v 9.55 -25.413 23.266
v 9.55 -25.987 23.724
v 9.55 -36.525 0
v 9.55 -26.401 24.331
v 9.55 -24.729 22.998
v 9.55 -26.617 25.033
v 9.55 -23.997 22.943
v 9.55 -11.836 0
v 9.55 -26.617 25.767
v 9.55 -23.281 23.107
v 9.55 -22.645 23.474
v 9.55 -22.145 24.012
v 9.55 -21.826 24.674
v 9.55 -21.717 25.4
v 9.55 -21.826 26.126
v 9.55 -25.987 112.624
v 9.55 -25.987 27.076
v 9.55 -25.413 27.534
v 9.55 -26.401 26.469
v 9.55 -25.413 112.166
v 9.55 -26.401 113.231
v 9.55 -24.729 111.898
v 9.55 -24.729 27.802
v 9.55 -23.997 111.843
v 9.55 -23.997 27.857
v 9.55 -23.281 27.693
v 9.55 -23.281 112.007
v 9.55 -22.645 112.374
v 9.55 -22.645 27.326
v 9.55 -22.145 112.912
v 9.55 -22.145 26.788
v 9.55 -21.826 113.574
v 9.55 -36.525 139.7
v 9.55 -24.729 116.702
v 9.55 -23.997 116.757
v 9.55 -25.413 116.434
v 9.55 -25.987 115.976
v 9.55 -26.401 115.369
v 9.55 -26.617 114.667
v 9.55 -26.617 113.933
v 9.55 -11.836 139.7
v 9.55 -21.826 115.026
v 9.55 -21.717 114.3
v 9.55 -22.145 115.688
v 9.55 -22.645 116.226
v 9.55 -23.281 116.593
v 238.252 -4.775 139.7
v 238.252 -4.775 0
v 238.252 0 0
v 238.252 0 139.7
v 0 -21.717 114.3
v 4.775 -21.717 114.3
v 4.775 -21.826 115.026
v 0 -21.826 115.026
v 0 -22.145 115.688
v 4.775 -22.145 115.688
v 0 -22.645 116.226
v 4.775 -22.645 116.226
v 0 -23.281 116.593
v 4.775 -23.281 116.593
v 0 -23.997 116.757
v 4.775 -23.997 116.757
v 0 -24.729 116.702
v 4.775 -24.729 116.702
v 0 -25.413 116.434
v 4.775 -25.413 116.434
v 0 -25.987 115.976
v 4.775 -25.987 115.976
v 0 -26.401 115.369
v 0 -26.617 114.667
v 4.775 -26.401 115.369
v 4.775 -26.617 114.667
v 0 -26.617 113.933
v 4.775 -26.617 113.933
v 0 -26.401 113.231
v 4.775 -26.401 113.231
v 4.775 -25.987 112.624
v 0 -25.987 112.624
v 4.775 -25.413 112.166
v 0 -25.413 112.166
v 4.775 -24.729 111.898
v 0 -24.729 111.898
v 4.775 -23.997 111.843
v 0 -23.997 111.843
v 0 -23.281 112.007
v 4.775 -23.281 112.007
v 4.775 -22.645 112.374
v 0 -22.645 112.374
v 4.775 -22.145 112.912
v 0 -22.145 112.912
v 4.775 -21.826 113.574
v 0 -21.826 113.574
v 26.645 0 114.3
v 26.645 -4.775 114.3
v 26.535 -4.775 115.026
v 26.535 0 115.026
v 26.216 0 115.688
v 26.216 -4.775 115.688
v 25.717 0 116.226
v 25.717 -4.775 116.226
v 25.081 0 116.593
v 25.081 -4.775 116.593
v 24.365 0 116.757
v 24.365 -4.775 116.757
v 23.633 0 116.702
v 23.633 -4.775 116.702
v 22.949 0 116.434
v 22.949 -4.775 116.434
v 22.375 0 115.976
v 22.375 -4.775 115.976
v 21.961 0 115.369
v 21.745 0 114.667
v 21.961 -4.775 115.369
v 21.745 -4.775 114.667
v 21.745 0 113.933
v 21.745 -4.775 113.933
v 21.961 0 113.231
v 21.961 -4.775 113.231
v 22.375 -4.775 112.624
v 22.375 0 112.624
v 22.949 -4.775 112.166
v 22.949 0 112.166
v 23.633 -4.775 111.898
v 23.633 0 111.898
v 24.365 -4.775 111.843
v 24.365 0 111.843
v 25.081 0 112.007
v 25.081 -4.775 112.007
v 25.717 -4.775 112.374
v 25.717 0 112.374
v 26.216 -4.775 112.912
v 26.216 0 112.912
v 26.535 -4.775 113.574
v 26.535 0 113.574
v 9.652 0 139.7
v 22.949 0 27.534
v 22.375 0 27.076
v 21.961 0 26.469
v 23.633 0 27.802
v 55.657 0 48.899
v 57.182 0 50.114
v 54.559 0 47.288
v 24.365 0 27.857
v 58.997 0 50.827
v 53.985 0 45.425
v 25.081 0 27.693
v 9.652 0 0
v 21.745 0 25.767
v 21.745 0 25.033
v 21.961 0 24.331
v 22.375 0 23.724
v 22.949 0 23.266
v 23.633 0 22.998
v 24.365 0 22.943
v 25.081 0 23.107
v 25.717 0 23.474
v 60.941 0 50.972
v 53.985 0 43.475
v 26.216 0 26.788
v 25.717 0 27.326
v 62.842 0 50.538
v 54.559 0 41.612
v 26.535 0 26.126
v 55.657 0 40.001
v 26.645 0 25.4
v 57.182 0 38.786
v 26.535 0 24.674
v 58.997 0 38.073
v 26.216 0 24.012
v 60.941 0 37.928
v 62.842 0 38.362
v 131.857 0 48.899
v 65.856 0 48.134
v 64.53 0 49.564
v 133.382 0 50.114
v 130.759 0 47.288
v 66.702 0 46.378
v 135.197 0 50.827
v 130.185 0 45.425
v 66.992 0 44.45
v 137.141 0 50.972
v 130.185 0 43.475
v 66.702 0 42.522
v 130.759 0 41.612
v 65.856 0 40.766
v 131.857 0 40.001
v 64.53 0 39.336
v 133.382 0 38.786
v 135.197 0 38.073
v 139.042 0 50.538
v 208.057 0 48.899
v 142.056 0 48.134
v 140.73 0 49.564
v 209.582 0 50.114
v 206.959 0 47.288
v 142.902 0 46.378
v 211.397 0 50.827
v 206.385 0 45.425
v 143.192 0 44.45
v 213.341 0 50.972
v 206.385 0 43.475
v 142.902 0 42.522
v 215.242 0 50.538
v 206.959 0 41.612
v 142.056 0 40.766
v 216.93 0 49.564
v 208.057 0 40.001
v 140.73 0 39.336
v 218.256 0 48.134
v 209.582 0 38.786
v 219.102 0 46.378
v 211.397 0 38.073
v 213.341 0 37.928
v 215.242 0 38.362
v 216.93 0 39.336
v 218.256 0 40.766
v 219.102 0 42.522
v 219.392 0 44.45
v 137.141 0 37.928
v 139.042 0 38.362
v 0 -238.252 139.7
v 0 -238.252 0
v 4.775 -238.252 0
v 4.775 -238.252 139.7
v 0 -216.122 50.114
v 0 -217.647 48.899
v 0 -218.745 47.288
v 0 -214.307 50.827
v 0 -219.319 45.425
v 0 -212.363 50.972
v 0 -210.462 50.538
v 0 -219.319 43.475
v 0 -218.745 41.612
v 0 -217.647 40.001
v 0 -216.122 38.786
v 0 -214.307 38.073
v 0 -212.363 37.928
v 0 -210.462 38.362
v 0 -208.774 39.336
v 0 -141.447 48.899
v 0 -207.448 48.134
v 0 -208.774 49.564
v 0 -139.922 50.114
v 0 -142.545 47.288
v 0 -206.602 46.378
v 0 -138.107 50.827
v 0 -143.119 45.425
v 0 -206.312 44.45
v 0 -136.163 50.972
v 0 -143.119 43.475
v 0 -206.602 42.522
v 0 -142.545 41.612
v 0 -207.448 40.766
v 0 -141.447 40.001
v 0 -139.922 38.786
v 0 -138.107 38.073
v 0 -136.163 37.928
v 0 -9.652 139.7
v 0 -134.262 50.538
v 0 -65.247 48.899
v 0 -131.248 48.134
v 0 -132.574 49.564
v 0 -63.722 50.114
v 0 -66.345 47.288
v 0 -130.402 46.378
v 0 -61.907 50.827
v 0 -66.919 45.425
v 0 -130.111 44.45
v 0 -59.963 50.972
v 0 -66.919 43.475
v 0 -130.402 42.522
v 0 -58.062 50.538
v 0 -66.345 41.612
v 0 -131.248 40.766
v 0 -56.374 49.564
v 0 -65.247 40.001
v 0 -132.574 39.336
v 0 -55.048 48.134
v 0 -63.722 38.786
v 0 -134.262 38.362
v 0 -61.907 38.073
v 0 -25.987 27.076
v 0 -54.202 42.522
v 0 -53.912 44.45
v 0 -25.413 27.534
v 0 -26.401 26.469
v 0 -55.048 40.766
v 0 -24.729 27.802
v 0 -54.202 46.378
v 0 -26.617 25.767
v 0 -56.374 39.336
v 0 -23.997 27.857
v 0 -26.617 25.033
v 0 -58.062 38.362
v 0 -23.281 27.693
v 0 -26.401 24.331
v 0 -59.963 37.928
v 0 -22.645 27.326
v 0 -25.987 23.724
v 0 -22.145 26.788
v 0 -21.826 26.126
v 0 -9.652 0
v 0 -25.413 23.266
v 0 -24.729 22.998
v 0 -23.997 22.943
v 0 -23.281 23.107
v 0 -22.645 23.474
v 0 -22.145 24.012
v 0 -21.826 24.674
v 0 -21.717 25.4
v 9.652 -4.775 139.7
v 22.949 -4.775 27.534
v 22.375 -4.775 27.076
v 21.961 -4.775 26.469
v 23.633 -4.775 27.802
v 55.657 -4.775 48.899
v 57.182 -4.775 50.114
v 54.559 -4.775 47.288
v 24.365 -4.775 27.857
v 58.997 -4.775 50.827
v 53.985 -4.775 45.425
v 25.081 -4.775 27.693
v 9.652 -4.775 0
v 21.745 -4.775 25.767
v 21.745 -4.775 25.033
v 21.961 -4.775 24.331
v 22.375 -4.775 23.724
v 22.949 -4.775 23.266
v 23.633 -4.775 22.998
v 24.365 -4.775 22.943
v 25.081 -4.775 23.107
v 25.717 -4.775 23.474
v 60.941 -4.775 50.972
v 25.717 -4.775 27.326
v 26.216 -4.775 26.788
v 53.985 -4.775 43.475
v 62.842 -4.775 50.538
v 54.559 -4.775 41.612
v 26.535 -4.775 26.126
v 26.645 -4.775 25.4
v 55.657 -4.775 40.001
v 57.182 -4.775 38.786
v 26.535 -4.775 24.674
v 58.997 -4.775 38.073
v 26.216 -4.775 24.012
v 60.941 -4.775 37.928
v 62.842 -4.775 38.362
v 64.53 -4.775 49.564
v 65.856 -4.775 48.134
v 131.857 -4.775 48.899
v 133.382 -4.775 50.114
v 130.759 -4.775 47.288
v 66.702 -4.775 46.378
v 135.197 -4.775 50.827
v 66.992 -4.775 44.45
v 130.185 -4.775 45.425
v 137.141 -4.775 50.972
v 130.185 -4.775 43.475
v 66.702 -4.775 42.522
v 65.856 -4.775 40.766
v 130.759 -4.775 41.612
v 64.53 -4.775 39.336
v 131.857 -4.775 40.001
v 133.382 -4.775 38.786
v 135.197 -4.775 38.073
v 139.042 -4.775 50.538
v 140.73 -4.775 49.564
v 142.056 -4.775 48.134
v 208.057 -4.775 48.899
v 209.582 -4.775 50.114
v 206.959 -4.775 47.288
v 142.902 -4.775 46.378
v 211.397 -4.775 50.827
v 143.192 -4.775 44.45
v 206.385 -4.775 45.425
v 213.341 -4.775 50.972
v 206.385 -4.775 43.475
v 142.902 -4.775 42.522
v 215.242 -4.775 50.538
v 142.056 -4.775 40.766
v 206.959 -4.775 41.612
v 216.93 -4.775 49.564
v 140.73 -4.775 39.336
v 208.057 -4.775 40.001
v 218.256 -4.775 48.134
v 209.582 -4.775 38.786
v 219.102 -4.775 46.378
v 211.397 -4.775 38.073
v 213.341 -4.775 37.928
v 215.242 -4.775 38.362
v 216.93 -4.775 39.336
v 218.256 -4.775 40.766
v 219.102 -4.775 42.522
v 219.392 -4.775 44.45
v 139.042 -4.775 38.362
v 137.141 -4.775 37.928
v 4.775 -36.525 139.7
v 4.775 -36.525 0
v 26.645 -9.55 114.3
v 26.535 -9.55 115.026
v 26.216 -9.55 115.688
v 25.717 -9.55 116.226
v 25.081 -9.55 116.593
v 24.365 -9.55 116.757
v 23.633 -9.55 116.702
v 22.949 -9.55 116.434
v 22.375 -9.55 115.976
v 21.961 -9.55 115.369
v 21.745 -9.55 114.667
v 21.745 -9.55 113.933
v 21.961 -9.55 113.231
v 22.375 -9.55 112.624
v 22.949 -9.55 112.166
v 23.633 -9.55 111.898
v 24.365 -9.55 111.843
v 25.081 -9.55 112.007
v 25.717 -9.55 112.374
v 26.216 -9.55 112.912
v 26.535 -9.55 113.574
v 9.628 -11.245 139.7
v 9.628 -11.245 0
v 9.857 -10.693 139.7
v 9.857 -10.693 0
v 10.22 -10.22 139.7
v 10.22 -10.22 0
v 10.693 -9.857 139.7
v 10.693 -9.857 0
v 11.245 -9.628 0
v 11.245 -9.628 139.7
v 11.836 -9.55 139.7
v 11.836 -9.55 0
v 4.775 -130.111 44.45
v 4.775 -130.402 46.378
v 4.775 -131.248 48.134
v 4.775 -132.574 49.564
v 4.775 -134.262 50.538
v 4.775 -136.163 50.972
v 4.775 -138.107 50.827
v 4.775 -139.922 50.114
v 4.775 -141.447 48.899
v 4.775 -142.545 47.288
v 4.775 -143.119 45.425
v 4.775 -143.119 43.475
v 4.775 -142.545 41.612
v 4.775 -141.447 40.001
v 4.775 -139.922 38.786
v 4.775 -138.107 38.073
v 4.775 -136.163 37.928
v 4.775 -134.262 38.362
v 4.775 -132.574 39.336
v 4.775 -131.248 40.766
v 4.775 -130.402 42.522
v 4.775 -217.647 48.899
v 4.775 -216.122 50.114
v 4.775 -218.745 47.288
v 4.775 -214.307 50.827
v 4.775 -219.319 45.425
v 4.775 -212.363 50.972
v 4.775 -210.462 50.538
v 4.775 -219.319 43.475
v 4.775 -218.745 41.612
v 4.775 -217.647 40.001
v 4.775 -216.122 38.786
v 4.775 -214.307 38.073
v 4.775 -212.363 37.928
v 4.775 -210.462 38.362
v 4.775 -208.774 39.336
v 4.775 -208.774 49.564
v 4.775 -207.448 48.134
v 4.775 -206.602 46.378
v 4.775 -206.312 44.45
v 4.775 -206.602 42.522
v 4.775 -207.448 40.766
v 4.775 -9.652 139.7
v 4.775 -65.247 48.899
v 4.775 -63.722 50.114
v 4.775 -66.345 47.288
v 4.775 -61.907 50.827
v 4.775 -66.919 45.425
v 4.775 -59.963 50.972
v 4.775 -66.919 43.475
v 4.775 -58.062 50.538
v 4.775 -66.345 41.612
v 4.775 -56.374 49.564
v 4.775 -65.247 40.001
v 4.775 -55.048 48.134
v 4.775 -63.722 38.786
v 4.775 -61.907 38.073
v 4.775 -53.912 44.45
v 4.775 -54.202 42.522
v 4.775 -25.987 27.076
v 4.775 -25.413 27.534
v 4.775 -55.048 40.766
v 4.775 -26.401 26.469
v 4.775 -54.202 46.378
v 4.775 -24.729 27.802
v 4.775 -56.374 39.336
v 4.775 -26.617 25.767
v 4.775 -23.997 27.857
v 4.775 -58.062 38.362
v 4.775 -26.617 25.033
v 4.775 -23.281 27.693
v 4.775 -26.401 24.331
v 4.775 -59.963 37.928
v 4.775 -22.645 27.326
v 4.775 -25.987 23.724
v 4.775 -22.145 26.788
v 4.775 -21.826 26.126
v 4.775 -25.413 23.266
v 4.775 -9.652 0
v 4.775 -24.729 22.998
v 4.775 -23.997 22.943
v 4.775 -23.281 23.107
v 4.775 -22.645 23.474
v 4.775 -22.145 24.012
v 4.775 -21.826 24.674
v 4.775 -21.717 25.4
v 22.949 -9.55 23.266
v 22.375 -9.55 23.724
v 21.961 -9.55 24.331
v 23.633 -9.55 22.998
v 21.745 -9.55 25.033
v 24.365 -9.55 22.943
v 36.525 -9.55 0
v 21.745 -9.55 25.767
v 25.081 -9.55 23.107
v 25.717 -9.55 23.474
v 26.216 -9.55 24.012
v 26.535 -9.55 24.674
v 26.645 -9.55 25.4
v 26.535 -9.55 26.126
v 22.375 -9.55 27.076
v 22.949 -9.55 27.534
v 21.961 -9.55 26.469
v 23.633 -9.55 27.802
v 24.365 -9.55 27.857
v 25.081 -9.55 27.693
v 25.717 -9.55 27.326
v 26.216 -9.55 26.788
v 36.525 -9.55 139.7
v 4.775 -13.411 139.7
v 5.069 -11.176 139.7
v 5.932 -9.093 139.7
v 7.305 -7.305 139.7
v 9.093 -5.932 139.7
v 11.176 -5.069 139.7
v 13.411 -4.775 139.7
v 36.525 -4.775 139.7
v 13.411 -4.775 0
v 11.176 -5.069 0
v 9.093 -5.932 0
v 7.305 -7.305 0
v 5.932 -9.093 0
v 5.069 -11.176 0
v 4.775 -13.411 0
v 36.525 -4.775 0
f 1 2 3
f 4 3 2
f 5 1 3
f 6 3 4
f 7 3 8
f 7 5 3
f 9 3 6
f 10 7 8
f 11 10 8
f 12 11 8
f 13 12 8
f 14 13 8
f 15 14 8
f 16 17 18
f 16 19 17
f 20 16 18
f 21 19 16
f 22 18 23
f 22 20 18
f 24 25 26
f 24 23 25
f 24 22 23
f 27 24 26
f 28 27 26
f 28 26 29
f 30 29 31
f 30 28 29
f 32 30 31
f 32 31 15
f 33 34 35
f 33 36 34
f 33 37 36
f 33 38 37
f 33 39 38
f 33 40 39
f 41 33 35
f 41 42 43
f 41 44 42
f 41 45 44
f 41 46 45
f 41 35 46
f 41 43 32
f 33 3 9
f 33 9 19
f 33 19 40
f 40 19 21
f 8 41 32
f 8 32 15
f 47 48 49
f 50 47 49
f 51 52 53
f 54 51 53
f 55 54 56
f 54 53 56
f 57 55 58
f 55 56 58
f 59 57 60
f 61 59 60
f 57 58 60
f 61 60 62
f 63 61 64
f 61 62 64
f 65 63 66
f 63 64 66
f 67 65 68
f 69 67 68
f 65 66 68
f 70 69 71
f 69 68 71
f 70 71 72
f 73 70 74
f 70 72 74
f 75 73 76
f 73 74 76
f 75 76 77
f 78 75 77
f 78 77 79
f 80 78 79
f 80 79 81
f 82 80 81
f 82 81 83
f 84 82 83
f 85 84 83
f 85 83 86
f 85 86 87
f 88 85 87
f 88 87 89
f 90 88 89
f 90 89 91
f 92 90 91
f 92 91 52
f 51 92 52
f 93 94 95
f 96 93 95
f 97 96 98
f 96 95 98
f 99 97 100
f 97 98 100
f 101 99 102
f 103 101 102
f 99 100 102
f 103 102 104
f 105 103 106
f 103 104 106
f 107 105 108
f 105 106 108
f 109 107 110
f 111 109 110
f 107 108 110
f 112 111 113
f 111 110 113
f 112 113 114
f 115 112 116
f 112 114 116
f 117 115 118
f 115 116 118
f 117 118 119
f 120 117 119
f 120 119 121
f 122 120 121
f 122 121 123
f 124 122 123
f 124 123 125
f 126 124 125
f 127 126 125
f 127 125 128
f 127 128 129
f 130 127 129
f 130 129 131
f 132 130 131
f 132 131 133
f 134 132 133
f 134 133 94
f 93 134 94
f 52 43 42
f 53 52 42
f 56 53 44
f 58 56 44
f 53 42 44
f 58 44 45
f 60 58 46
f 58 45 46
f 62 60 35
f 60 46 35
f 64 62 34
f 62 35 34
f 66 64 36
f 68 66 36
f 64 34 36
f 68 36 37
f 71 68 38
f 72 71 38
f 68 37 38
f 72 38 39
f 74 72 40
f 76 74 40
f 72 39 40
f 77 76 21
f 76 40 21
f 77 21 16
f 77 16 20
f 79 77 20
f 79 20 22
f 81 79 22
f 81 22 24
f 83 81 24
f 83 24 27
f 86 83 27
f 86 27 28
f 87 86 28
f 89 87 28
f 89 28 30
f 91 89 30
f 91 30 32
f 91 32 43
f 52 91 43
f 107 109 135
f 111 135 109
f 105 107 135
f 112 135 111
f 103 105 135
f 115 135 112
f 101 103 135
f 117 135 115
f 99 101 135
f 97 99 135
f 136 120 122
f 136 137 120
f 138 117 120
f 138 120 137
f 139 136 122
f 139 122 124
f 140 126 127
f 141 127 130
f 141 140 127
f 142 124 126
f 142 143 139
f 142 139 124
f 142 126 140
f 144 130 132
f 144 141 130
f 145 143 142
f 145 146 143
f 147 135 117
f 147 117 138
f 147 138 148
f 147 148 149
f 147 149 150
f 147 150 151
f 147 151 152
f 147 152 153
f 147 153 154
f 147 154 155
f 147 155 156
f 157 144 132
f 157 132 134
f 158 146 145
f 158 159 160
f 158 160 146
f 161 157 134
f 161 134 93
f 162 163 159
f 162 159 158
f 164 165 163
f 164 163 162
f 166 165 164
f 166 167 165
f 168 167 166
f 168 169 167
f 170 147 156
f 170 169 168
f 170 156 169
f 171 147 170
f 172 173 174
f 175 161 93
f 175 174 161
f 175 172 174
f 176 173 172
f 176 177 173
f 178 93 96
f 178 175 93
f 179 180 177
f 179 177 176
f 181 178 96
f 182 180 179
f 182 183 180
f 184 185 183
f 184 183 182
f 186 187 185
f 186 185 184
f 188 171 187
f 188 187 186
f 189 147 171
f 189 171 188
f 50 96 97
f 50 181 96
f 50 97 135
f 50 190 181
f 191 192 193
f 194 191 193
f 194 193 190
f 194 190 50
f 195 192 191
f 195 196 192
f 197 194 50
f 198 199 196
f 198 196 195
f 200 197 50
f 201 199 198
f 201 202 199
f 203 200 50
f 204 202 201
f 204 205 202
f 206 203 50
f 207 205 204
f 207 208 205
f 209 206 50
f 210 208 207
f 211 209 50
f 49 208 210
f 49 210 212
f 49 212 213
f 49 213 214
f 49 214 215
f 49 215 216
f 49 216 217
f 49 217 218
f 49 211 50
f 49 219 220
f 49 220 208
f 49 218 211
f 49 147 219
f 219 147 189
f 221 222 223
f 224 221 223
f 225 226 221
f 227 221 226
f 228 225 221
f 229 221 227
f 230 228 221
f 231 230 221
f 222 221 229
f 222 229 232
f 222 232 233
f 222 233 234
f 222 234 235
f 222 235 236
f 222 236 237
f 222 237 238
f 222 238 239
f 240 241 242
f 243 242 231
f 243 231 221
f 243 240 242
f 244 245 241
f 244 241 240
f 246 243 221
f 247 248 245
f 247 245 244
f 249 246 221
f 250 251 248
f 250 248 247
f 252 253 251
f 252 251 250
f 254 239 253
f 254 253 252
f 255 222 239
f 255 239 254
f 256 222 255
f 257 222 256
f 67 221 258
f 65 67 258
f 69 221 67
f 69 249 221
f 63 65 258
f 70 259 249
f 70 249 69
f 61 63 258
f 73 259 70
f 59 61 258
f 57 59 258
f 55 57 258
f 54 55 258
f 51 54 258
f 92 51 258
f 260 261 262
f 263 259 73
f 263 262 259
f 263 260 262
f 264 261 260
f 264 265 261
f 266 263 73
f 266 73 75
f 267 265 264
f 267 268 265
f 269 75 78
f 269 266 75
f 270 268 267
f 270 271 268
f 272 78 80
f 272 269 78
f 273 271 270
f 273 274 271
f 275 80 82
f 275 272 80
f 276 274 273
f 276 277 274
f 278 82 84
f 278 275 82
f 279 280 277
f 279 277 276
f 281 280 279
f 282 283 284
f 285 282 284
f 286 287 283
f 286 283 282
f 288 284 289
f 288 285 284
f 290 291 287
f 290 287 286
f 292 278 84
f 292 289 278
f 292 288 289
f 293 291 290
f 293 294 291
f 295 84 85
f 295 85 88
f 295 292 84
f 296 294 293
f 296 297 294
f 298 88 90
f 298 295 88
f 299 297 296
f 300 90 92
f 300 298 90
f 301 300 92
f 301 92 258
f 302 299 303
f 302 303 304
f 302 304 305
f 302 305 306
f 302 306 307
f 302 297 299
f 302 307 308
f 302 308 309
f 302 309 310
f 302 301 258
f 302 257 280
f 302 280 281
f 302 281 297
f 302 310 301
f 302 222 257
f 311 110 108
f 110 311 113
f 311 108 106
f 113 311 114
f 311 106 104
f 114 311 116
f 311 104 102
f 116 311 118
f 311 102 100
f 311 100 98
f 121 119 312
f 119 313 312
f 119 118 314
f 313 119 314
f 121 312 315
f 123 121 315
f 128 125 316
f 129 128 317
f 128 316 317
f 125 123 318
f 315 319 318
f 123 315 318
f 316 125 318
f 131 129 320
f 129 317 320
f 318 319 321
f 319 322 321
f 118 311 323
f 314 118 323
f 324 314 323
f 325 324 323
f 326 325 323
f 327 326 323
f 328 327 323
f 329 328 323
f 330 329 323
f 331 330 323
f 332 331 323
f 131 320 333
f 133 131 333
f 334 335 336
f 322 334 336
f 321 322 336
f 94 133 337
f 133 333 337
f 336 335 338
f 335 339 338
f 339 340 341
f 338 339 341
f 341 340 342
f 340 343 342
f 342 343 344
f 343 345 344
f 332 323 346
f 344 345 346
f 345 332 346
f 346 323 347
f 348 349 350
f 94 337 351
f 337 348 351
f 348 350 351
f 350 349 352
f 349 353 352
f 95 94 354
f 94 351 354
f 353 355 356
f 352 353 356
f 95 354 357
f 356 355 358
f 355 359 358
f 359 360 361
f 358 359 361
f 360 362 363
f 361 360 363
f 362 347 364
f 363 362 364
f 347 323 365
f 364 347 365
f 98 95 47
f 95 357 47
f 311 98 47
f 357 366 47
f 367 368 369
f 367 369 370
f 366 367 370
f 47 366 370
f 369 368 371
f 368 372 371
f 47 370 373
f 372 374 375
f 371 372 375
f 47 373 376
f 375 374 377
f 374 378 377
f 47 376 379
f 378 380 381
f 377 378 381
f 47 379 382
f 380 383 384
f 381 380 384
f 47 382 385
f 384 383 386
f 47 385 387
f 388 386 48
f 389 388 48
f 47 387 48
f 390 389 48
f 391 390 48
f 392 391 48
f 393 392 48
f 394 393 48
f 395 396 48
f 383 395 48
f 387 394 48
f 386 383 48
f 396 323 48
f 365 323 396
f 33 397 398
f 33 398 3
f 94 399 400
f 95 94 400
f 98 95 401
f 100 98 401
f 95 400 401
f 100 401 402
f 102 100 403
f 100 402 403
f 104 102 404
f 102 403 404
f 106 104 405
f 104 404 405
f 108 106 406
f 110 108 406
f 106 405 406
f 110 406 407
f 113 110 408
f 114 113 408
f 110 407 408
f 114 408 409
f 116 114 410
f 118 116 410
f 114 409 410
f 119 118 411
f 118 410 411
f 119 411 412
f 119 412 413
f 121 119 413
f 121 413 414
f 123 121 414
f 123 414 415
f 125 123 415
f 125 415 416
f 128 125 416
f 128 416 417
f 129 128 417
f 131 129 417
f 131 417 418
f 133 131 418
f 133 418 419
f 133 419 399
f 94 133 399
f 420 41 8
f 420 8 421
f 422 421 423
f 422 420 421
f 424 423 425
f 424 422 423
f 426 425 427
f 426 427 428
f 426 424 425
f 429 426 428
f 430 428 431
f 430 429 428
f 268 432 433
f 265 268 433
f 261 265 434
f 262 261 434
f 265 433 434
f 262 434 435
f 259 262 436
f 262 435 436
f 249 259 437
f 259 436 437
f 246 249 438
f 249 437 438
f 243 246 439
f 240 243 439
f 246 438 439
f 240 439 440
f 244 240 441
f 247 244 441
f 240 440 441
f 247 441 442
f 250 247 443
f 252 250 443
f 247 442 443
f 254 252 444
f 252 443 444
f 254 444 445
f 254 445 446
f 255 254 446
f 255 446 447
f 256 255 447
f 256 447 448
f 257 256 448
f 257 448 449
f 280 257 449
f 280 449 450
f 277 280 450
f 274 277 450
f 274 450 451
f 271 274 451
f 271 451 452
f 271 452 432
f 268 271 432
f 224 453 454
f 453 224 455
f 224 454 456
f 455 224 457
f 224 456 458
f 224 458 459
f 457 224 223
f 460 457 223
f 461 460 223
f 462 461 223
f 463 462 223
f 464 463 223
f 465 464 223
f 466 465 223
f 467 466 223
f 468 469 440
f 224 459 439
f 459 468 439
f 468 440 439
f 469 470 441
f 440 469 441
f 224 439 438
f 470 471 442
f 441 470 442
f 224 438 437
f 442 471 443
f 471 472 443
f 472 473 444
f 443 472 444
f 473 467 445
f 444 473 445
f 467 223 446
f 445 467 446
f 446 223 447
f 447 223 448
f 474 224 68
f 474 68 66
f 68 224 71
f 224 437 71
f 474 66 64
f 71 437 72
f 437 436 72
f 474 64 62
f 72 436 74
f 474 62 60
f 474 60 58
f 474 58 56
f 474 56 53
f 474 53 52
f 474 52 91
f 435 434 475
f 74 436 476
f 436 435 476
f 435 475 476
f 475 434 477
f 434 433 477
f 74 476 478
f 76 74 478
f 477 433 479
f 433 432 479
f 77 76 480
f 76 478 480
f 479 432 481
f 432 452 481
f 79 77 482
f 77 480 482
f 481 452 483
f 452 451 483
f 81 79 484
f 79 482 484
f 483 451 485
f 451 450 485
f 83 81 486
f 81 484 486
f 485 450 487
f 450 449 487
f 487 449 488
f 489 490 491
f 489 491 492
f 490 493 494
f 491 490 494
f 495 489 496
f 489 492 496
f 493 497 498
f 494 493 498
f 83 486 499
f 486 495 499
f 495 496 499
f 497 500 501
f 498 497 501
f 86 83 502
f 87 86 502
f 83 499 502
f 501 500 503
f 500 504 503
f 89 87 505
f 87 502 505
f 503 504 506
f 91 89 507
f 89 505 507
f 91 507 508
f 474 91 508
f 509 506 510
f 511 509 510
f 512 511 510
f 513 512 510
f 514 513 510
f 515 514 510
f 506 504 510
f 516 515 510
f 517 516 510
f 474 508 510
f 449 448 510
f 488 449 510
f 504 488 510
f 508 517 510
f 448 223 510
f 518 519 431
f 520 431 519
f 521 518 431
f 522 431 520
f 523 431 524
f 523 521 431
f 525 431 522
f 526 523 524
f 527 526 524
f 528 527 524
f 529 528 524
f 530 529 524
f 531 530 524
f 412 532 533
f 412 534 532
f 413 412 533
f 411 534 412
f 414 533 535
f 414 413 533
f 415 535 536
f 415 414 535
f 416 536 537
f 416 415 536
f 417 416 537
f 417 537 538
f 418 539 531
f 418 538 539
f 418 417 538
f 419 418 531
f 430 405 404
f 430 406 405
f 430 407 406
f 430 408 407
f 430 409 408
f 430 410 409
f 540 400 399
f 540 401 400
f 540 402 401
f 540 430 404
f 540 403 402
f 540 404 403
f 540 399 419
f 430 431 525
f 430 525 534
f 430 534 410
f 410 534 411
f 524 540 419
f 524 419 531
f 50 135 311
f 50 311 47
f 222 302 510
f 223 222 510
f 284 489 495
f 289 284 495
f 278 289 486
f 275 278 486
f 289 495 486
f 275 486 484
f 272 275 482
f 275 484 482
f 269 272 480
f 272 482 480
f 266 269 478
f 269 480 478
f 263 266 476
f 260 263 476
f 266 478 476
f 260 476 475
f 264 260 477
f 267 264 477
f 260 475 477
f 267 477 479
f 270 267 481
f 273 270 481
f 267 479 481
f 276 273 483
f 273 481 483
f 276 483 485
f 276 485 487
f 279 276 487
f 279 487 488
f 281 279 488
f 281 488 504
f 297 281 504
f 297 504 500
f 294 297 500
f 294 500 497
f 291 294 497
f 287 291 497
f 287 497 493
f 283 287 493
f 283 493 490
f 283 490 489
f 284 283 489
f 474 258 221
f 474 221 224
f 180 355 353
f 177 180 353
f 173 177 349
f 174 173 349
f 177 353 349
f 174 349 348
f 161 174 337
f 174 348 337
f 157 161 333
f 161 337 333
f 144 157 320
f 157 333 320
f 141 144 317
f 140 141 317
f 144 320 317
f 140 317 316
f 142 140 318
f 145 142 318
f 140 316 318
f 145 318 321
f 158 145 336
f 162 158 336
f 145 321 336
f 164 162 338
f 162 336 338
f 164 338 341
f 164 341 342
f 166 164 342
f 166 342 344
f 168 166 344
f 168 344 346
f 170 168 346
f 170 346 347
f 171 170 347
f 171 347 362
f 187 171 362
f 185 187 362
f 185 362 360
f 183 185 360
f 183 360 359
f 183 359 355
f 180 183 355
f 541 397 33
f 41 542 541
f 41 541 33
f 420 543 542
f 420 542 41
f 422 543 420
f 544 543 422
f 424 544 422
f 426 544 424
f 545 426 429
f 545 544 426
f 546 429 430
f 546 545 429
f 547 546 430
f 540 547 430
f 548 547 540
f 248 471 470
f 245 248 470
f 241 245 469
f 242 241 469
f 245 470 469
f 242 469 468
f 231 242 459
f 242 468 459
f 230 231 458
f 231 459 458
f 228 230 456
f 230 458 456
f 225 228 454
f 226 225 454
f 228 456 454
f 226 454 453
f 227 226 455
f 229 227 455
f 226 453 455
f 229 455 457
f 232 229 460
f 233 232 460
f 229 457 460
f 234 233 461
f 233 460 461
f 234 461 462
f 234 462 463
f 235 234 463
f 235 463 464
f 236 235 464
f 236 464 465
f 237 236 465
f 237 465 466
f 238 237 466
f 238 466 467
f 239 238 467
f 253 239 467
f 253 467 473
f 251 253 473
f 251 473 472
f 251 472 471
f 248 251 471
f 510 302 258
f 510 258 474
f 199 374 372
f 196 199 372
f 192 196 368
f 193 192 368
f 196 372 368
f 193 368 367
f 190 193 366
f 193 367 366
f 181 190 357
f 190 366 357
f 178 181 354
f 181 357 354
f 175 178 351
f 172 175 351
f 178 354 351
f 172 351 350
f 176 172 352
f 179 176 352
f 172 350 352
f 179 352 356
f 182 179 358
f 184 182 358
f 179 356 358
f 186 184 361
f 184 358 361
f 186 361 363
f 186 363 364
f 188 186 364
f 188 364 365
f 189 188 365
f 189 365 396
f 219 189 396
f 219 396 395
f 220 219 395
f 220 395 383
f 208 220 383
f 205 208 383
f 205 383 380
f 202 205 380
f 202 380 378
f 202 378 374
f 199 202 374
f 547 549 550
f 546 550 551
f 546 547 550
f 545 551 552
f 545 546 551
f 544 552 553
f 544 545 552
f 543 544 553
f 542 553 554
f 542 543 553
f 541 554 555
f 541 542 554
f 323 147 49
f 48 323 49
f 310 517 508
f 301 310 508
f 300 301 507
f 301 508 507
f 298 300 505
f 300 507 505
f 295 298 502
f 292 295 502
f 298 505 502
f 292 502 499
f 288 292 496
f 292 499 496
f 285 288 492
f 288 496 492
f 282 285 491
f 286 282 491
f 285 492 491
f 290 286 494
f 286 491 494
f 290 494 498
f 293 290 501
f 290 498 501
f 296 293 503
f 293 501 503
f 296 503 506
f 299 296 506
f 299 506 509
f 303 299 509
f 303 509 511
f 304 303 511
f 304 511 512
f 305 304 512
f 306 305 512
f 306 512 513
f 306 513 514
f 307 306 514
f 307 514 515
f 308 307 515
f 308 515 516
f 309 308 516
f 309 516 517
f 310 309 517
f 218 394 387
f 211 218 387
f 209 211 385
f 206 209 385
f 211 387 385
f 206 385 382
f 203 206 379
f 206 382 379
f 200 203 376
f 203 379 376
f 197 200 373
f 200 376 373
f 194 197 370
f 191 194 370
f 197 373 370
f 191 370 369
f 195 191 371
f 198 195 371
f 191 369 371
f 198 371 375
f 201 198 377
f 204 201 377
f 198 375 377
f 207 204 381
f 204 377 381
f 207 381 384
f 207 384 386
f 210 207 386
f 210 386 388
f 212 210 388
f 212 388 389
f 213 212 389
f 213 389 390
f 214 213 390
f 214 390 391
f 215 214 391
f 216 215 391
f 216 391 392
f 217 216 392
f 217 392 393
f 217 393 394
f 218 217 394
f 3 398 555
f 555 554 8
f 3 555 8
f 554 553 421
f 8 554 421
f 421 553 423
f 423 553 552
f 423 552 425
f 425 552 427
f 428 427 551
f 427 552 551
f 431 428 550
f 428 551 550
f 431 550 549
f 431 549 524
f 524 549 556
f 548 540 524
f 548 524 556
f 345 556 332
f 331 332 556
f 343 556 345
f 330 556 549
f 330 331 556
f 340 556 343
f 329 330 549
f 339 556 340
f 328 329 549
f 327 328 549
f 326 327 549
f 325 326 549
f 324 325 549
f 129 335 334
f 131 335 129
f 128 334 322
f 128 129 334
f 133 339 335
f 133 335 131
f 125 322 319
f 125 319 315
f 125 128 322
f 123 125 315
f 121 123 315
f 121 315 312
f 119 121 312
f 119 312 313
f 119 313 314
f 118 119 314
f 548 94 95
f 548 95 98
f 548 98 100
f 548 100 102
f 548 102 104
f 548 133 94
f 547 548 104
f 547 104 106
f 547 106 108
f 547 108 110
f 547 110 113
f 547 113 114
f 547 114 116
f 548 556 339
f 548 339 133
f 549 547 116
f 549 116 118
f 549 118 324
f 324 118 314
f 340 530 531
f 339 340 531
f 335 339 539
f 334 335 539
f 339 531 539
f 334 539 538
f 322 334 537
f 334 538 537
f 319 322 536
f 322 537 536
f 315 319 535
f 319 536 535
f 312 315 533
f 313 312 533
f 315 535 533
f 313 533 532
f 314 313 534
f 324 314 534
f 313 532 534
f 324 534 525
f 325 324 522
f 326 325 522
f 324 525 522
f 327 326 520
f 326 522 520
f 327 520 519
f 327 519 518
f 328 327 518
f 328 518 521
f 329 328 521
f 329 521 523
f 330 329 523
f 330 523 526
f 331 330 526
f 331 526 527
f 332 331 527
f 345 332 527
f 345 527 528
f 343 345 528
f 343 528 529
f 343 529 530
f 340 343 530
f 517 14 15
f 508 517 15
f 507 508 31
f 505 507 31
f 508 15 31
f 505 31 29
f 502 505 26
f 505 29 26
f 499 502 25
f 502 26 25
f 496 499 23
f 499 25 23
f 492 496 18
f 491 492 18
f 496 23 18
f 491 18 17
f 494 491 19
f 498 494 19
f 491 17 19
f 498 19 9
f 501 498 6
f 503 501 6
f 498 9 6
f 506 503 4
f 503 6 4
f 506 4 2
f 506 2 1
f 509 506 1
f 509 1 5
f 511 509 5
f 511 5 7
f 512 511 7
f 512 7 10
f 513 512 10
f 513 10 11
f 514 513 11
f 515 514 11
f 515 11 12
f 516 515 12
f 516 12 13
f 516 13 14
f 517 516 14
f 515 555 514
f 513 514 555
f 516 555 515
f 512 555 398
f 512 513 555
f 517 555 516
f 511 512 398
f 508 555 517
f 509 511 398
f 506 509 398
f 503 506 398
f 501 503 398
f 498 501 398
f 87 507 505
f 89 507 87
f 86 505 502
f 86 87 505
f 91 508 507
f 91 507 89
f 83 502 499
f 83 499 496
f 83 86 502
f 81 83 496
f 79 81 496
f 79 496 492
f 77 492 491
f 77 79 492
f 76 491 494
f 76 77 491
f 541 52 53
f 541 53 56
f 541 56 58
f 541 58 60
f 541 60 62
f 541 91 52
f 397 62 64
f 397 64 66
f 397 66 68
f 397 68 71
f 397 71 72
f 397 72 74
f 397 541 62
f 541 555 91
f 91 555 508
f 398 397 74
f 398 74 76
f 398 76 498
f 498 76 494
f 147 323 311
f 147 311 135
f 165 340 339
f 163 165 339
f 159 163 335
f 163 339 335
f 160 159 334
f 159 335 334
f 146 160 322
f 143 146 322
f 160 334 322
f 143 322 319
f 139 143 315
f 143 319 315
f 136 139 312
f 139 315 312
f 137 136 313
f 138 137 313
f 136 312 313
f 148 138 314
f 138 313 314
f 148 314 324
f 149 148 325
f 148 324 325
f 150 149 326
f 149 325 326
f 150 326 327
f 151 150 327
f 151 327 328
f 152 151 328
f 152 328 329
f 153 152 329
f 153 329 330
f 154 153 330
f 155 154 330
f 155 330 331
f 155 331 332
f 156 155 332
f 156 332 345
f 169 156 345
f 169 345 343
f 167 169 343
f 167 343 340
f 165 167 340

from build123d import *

# Parameters (mm, degrees)
F0_W      = 228.6
F0_H      = 4.7752
F1_DEPTH  = 139.7
F0_W_2    = 4.7752
F0_H_2    = 228.6
F3_DEPTH  = 139.7
F4_R      = 6.5405
F5_DEPTH  = 25.4
F6_R      = 6.5405
F7_DEPTH  = 25.4
F8_R      = 2.4638
F9_DEPTH  = 25.4
F10_R     = 2.4638
F11_DEPTH = 25.4
F12_R     = 2.4638
F13_DEPTH = 25.4
F14_R     = 2.4638
F15_DEPTH = 25.4


with BuildPart() as f1:
    # F0 (on Top) → F1 (new body)
    with BuildSketch(Plane.XY):
        with Locations((123.952, -2.3876)):
            Rectangle(F0_W, F0_H)
    extrude(amount=F1_DEPTH)

    # F6 (on face) → F7 (cut)
    with BuildSketch(Plane.XZ.offset(4.7752)):
        with Locations((212.852, 44.45)):
            Circle(F6_R)
        with Locations((136.652, 44.45)):
            Circle(F6_R)
        with Locations((60.452, 44.45)):
            Circle(F6_R)
    extrude(amount=-F7_DEPTH, mode=Mode.SUBTRACT)


with BuildPart() as f1b:
    # F0 (on Top) → F1, piece 2 (new body)
    with BuildSketch(Plane.XY):
        with Locations((2.3876, -123.952)):
            Rectangle(F0_W_2, F0_H_2)
    extrude(amount=F1_DEPTH)

    # F4 (on face) → F5 (cut)
    with BuildSketch(Plane.YZ.offset(4.7752)):
        with Locations((-212.852, 44.45)):
            Circle(F4_R)
        with Locations((-136.652, 44.45)):
            Circle(F4_R)
        with Locations((-60.452, 44.45)):
            Circle(F4_R)
    extrude(amount=-F5_DEPTH, mode=Mode.SUBTRACT)


with BuildPart() as f3:
    # F2 (on face) → F3 (new body)
    with BuildSketch(Plane.XY.offset(139.7)):
        with BuildLine():
            ThreePointArc((13.4112, -4.7752), (7.3046258377, -7.3046258377), (4.7752, -13.4112))
            Line((4.7752, -13.4112), (4.7752, -36.5252))
            Line((4.7752, -36.5252), (9.5504, -36.5252))
            Line((9.5504, -36.5252), (9.5504, -11.8364))
            ThreePointArc((9.5504, -11.8364), (10.2199538982, -10.2199538982), (11.8364, -9.5504))
            Line((11.8364, -9.5504), (36.5252, -9.5504))
            Line((36.5252, -9.5504), (36.5252, -4.7752))
            Line((36.5252, -4.7752), (13.4112, -4.7752))
        make_face()
    extrude(amount=-F3_DEPTH)


with BuildPart() as f9_tool:
    # F8 (on face) → F9 (new body)
    with BuildSketch(Plane.YZ.offset(9.5504)):
        with Locations((-24.1808, 114.3)):
            Circle(F8_R)
        with Locations((-24.1808, 25.4)):
            Circle(F8_R)
    extrude(amount=-F9_DEPTH)


with BuildPart() as f1b_1:
    add(f1b.part)

    # F9: cut by f9_tool
    add(f9_tool.part, mode=Mode.SUBTRACT)


with BuildPart() as f3_1:
    add(f3.part)

    # F9: cut by f9_tool
    add(f9_tool.part, mode=Mode.SUBTRACT)


with BuildPart() as f11_tool:
    # F10 (on face) → F11 (new body)
    with BuildSketch(Plane.XZ.offset(9.5504)):
        with Locations((24.1808, 114.3)):
            Circle(F10_R)
        with Locations((24.1808, 25.4)):
            Circle(F10_R)
    extrude(amount=-F11_DEPTH)


with BuildPart() as f1_1:
    add(f1.part)

    # F11: cut by f11_tool
    add(f11_tool.part, mode=Mode.SUBTRACT)

    # F12 (on face) → F13 (cut)
    with BuildSketch(Plane.YZ.offset(4.7752)):
        with Locations((-24.1808, 114.3)):
            Circle(F12_R)
        with Locations((-24.1808, 25.4)):
            Circle(F12_R)
    extrude(amount=-F13_DEPTH, mode=Mode.SUBTRACT)

    # F14 (on face) → F15 (cut)
    with BuildSketch(Plane.XZ.offset(4.7752)):
        with Locations((24.1808, 114.3)):
            Circle(F14_R)
        with Locations((24.1808, 25.4)):
            Circle(F14_R)
    extrude(amount=-F15_DEPTH, mode=Mode.SUBTRACT)


with BuildPart() as f3_2:
    add(f3_1.part)

    # F11: cut by f11_tool
    add(f11_tool.part, mode=Mode.SUBTRACT)


solid = Compound([f1b_1.part, f1_1.part, f3_2.part])
